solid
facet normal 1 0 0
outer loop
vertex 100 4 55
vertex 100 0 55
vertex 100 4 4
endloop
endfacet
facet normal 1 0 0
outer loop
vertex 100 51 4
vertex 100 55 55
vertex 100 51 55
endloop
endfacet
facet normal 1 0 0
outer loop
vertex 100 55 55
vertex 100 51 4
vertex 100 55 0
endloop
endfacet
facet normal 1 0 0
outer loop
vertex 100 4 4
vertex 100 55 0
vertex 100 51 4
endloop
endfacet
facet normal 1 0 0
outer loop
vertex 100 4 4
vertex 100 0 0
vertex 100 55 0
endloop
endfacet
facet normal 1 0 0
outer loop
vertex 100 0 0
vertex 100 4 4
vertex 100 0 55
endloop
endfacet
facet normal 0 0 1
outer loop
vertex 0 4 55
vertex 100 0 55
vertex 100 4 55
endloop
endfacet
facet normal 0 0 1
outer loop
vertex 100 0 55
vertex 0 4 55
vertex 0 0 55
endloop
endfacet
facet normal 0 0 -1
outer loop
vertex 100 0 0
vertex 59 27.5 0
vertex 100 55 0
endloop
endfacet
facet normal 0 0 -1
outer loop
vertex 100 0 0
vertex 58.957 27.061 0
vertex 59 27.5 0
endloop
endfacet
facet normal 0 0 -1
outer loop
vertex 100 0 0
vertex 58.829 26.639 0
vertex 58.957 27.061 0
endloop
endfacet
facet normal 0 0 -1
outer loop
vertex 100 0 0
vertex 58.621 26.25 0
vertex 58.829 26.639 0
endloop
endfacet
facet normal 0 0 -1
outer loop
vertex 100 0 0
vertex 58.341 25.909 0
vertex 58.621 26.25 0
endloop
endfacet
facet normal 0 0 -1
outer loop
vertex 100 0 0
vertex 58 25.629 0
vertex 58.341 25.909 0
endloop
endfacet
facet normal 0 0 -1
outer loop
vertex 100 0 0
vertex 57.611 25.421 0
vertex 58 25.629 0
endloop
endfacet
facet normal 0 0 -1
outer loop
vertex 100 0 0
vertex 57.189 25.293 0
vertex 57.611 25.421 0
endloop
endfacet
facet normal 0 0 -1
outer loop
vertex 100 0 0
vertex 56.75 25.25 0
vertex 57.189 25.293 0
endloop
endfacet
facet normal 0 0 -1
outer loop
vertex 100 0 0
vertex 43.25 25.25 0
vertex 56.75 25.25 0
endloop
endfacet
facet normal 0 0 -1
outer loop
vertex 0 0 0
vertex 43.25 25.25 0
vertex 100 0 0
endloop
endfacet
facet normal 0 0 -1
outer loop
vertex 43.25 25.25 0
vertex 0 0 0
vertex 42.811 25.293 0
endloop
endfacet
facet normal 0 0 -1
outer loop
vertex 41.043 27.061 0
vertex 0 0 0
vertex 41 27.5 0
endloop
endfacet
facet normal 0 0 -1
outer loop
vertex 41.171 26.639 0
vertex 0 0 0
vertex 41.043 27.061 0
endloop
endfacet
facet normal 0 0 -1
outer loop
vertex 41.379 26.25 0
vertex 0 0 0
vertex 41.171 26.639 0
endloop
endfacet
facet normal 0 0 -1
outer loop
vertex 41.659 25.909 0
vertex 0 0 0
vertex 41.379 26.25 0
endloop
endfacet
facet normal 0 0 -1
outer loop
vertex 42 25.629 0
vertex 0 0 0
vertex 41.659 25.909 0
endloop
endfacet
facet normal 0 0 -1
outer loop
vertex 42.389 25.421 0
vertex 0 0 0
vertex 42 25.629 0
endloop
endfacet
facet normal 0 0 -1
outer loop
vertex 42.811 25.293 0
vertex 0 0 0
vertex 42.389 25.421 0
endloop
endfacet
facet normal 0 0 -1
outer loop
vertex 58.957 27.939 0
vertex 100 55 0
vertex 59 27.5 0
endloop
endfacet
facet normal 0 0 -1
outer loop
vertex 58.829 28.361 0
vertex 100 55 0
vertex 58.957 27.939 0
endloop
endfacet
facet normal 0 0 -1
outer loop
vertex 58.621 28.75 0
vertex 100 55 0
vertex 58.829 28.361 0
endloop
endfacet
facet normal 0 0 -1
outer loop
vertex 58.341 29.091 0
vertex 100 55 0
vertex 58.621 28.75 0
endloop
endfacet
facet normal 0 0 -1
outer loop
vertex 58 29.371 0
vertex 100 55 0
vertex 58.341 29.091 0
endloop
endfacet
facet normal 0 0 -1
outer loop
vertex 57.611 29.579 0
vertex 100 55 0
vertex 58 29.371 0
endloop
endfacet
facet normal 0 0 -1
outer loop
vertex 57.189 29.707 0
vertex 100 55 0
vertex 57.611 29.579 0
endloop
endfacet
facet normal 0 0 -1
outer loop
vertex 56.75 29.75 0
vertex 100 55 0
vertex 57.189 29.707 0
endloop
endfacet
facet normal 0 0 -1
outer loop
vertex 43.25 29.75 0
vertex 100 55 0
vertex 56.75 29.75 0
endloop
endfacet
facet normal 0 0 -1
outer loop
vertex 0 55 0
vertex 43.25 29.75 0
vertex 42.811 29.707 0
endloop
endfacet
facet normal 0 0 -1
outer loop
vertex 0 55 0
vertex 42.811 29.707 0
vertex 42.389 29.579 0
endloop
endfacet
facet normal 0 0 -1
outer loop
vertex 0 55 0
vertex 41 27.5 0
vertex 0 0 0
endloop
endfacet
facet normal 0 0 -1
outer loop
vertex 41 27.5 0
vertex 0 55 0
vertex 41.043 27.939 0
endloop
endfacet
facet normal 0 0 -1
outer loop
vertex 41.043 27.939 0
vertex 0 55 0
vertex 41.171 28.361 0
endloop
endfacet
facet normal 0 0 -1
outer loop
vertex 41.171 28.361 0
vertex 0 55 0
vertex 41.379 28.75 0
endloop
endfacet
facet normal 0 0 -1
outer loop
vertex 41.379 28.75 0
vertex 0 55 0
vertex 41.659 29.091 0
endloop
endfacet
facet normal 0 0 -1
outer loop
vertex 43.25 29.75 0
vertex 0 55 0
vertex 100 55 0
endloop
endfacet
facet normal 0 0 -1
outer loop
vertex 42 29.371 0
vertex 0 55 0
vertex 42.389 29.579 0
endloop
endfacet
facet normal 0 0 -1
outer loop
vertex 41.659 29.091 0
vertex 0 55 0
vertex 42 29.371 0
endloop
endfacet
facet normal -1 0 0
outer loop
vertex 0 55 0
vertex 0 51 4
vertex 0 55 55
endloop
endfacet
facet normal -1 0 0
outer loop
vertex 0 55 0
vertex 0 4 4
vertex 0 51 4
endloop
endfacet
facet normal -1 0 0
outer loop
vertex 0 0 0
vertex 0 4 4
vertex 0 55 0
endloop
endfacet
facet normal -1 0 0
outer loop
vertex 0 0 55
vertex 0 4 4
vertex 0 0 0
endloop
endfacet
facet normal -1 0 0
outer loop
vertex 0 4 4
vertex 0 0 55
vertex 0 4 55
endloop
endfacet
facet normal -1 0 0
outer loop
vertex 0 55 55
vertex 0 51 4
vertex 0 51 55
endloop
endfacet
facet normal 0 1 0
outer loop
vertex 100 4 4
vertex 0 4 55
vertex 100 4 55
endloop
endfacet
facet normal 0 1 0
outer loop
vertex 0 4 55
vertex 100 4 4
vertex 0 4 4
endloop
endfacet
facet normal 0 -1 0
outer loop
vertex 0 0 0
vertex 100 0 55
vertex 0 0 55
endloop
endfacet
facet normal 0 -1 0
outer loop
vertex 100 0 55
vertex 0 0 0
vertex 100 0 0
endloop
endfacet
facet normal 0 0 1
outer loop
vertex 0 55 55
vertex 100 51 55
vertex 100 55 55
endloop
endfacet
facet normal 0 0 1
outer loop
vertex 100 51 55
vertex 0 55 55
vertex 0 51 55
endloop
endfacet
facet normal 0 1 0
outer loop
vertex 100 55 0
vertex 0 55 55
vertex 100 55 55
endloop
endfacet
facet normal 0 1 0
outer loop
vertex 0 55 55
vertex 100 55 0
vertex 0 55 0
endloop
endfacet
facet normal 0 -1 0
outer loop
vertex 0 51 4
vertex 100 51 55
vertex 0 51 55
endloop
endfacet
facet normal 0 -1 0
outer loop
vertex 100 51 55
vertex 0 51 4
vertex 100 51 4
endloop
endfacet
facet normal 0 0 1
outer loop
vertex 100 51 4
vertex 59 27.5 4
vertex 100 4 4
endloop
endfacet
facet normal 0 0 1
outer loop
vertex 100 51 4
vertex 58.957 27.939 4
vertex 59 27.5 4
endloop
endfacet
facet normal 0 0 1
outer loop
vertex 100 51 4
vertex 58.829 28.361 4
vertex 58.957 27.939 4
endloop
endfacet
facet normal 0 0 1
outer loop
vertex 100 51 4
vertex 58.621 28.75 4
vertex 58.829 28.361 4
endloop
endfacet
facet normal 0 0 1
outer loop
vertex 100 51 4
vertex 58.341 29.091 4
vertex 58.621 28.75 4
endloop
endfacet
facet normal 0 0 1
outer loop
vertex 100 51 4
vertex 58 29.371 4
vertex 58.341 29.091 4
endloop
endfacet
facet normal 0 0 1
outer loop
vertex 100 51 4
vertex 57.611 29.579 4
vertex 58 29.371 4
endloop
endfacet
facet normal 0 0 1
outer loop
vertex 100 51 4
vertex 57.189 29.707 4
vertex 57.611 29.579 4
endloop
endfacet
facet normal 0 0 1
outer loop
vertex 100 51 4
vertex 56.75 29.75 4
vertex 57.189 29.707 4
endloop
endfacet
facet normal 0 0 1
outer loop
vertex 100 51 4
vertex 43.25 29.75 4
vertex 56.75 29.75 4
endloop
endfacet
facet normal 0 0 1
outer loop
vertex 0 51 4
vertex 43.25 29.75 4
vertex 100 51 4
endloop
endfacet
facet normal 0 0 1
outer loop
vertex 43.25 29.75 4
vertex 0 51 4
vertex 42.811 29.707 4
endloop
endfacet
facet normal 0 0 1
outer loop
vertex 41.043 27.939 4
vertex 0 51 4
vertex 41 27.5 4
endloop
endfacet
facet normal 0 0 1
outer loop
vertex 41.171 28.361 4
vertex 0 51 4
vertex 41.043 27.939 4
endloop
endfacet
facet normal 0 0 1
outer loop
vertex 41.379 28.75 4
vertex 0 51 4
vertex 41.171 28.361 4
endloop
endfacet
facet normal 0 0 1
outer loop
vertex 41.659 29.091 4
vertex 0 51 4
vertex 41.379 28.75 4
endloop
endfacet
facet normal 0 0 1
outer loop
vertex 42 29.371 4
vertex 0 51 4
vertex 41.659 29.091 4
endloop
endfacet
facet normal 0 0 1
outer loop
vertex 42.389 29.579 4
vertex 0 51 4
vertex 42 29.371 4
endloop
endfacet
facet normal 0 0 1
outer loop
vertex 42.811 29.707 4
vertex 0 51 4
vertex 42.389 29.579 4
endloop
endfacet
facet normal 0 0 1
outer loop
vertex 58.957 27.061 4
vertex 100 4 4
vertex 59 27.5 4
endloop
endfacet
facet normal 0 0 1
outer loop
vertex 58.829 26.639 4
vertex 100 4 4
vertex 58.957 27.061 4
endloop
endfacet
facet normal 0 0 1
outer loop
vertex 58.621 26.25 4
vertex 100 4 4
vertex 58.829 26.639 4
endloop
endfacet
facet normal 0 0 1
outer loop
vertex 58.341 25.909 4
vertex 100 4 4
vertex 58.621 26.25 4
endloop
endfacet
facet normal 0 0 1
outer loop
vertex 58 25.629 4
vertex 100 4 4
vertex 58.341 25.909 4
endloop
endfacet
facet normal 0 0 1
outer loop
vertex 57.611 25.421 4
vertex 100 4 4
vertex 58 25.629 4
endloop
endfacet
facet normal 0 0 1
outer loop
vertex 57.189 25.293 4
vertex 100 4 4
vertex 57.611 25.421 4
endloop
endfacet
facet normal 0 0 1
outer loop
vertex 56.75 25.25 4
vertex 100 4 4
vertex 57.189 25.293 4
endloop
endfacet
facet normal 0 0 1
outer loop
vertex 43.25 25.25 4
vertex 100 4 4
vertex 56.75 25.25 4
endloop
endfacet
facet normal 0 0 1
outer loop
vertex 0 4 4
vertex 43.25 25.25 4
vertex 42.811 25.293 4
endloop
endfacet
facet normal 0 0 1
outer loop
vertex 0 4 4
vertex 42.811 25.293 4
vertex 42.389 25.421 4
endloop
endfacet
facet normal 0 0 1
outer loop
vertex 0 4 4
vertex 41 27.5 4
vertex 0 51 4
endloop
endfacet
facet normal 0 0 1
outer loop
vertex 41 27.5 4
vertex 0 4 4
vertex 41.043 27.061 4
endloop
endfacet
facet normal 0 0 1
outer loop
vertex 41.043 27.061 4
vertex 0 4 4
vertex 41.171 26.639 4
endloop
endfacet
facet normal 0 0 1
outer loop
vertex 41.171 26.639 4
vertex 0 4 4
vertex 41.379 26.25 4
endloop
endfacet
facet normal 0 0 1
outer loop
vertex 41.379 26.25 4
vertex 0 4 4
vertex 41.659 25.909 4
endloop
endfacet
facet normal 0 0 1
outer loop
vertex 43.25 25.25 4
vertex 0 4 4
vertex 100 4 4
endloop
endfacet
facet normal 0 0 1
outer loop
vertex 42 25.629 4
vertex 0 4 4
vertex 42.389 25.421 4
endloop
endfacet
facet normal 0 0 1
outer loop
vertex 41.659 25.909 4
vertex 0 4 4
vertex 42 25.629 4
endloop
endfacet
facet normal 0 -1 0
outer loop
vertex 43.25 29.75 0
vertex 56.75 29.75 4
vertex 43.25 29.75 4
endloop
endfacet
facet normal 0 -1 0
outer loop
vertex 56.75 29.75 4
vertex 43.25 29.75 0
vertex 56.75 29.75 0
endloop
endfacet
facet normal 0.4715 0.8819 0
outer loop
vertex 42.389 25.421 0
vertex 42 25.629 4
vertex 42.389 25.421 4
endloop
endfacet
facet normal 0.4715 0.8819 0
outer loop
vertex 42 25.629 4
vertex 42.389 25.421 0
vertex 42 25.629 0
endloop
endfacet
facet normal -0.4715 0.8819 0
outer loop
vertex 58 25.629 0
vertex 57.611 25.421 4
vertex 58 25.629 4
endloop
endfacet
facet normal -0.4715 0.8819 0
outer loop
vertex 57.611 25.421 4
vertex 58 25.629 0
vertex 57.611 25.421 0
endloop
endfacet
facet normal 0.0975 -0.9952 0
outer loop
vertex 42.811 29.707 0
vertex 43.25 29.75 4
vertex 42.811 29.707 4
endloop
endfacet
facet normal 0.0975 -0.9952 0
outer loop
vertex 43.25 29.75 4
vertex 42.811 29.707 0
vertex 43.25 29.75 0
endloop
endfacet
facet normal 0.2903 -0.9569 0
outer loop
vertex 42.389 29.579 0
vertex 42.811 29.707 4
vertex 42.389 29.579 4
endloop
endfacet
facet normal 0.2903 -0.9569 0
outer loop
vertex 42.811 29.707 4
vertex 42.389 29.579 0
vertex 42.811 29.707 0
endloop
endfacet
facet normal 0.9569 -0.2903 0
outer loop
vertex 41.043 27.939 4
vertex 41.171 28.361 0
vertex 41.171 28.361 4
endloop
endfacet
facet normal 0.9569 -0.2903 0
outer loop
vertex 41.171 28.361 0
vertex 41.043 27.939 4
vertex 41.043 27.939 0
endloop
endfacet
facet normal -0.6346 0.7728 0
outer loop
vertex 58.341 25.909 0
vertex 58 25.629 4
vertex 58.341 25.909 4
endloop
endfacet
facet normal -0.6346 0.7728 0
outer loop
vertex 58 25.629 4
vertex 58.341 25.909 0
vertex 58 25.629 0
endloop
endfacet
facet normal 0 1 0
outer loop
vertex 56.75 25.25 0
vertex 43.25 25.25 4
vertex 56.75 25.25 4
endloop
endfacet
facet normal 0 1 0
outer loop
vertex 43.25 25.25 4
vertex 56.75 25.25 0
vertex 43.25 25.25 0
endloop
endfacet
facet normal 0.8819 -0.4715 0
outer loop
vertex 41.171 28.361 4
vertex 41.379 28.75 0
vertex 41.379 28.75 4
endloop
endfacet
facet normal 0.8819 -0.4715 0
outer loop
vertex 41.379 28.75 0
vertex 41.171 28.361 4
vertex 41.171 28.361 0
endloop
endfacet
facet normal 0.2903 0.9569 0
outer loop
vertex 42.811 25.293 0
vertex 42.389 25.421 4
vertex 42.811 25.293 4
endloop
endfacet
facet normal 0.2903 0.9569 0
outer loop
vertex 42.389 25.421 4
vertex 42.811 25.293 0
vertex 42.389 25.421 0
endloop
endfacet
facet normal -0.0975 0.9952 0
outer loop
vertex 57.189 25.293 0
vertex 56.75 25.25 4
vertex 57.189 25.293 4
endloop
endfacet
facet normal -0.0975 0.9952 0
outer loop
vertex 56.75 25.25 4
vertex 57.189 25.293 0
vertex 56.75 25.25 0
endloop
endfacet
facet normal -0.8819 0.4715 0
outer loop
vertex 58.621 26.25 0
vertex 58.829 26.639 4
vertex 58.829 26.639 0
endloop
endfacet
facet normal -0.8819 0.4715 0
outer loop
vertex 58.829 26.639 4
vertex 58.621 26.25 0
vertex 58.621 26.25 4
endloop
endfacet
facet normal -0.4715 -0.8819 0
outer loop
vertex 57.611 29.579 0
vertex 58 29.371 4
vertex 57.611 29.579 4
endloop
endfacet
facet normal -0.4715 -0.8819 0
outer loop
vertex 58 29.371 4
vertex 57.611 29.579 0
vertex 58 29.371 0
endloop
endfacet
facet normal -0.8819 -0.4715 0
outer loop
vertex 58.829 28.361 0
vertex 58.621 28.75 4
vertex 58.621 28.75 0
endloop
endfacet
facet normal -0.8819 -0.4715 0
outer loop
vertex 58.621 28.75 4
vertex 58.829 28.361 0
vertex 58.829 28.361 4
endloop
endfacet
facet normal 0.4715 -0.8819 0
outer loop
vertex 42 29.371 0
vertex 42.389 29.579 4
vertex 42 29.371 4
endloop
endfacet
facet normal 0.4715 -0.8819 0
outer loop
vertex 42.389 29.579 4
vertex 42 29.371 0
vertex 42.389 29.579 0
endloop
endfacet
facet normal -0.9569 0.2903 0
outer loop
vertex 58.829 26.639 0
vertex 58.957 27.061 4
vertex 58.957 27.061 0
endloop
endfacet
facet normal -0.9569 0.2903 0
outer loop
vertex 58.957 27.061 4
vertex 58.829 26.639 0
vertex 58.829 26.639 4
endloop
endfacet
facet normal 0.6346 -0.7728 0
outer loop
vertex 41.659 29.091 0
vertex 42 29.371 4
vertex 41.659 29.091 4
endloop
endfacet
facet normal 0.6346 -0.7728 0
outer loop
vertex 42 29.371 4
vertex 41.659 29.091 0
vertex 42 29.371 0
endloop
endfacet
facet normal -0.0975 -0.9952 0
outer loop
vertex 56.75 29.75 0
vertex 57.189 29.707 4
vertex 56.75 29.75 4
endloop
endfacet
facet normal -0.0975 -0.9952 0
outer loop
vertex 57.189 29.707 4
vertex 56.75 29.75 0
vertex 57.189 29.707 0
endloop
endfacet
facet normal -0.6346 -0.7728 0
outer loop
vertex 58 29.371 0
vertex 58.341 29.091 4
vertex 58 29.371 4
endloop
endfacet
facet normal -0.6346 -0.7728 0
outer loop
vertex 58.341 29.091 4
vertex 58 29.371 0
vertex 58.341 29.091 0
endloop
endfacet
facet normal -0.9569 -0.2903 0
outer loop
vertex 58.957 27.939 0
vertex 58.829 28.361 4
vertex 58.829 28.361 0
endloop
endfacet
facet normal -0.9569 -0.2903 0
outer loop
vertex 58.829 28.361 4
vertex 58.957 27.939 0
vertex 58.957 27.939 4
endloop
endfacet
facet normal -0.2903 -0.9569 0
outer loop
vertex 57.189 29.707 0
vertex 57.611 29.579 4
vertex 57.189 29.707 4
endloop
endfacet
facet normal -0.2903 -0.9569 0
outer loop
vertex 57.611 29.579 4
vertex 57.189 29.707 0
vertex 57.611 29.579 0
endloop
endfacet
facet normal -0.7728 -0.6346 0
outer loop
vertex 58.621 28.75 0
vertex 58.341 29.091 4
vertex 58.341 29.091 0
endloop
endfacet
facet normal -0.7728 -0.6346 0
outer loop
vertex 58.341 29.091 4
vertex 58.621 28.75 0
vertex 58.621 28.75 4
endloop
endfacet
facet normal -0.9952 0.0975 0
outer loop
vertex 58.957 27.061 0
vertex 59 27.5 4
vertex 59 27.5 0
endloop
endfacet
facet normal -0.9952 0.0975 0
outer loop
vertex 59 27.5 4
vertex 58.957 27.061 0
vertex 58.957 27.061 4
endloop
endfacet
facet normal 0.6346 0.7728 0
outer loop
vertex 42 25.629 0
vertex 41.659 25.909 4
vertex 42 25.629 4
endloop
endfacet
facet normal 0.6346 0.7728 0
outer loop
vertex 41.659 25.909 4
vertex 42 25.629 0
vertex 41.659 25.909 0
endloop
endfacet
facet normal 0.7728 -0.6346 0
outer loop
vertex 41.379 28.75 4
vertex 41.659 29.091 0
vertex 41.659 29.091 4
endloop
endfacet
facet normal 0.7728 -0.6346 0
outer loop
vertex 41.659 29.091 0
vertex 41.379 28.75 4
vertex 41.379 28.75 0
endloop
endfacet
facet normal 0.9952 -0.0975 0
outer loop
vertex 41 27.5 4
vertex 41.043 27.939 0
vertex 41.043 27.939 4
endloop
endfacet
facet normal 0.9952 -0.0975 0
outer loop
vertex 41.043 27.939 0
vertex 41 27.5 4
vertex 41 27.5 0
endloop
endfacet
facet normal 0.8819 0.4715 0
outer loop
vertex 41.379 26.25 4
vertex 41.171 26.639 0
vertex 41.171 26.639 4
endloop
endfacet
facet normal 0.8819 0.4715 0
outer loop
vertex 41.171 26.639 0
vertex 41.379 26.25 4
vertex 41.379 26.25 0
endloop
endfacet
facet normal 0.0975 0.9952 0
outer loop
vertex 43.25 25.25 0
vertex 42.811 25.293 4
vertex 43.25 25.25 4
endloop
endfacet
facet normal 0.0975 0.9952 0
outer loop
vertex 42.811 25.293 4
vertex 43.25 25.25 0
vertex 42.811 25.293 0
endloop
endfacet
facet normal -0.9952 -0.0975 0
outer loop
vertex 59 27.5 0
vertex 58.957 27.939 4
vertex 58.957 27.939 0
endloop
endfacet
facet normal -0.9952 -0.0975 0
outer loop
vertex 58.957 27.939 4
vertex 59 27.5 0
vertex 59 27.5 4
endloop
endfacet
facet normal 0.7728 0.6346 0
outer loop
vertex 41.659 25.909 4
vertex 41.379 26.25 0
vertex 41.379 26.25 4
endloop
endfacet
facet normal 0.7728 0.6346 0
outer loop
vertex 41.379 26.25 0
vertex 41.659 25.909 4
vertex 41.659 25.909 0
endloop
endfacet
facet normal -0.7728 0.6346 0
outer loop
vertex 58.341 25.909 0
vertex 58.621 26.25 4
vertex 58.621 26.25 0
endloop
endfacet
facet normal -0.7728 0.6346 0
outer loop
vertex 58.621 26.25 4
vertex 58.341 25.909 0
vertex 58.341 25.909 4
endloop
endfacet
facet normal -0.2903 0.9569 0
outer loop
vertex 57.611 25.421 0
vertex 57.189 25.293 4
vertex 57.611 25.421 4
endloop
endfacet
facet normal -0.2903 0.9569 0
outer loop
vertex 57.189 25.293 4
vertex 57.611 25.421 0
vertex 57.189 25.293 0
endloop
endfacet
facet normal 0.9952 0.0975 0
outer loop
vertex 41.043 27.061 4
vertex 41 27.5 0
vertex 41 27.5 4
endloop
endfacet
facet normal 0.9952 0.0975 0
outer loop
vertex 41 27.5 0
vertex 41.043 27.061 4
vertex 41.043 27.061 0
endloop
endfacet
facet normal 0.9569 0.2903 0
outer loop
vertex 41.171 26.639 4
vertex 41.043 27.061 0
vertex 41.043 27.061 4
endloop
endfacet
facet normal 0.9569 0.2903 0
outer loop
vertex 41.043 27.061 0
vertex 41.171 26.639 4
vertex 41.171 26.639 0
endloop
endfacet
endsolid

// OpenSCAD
$fn = 32;

// ----------------------------------------------------------------------
// U-bracket: 100 x 55 x 55 mm
// ----------------------------------------------------------------------

// --- parameters (mm) ---
rail_len = 100;           // outer length, X
jaw_w = 55;               // outer width, Y
jaw_h = 55;               // upright height, Z
web_t = 4;                // wall thickness
hole_d = 4.5;             // clearance for M4
slot_l = 18;              // slot length

module hole_z(px, py) {
  translate([px, py, -0.5]) cylinder(h = web_t + 1, d = hole_d);
}
module hole_y_pz(pz) {
  /* through both uprights along Y */
  translate([0, -0.5, pz]) rotate([-90, 0, 0]) cylinder(h = jaw_w + 1, d = hole_d);
}
module slot_z(px, py) {
  hull() {
    translate([px - (slot_l - hole_d) / 2, py, -0.5]) cylinder(h = web_t + 1, d = hole_d);
    translate([px + (slot_l - hole_d) / 2, py, -0.5]) cylinder(h = web_t + 1, d = hole_d);
  }
}

module base() {
  cube([rail_len, jaw_w, web_t]);
}

module uprights() {
  cube([rail_len, web_t, jaw_h]);
  translate([0, jaw_w - web_t, 0]) cube([rail_len, web_t, jaw_h]);
}

difference() {
  union() {
    base();
    uprights();
  }
  slot_z(50, 27.5);
}
